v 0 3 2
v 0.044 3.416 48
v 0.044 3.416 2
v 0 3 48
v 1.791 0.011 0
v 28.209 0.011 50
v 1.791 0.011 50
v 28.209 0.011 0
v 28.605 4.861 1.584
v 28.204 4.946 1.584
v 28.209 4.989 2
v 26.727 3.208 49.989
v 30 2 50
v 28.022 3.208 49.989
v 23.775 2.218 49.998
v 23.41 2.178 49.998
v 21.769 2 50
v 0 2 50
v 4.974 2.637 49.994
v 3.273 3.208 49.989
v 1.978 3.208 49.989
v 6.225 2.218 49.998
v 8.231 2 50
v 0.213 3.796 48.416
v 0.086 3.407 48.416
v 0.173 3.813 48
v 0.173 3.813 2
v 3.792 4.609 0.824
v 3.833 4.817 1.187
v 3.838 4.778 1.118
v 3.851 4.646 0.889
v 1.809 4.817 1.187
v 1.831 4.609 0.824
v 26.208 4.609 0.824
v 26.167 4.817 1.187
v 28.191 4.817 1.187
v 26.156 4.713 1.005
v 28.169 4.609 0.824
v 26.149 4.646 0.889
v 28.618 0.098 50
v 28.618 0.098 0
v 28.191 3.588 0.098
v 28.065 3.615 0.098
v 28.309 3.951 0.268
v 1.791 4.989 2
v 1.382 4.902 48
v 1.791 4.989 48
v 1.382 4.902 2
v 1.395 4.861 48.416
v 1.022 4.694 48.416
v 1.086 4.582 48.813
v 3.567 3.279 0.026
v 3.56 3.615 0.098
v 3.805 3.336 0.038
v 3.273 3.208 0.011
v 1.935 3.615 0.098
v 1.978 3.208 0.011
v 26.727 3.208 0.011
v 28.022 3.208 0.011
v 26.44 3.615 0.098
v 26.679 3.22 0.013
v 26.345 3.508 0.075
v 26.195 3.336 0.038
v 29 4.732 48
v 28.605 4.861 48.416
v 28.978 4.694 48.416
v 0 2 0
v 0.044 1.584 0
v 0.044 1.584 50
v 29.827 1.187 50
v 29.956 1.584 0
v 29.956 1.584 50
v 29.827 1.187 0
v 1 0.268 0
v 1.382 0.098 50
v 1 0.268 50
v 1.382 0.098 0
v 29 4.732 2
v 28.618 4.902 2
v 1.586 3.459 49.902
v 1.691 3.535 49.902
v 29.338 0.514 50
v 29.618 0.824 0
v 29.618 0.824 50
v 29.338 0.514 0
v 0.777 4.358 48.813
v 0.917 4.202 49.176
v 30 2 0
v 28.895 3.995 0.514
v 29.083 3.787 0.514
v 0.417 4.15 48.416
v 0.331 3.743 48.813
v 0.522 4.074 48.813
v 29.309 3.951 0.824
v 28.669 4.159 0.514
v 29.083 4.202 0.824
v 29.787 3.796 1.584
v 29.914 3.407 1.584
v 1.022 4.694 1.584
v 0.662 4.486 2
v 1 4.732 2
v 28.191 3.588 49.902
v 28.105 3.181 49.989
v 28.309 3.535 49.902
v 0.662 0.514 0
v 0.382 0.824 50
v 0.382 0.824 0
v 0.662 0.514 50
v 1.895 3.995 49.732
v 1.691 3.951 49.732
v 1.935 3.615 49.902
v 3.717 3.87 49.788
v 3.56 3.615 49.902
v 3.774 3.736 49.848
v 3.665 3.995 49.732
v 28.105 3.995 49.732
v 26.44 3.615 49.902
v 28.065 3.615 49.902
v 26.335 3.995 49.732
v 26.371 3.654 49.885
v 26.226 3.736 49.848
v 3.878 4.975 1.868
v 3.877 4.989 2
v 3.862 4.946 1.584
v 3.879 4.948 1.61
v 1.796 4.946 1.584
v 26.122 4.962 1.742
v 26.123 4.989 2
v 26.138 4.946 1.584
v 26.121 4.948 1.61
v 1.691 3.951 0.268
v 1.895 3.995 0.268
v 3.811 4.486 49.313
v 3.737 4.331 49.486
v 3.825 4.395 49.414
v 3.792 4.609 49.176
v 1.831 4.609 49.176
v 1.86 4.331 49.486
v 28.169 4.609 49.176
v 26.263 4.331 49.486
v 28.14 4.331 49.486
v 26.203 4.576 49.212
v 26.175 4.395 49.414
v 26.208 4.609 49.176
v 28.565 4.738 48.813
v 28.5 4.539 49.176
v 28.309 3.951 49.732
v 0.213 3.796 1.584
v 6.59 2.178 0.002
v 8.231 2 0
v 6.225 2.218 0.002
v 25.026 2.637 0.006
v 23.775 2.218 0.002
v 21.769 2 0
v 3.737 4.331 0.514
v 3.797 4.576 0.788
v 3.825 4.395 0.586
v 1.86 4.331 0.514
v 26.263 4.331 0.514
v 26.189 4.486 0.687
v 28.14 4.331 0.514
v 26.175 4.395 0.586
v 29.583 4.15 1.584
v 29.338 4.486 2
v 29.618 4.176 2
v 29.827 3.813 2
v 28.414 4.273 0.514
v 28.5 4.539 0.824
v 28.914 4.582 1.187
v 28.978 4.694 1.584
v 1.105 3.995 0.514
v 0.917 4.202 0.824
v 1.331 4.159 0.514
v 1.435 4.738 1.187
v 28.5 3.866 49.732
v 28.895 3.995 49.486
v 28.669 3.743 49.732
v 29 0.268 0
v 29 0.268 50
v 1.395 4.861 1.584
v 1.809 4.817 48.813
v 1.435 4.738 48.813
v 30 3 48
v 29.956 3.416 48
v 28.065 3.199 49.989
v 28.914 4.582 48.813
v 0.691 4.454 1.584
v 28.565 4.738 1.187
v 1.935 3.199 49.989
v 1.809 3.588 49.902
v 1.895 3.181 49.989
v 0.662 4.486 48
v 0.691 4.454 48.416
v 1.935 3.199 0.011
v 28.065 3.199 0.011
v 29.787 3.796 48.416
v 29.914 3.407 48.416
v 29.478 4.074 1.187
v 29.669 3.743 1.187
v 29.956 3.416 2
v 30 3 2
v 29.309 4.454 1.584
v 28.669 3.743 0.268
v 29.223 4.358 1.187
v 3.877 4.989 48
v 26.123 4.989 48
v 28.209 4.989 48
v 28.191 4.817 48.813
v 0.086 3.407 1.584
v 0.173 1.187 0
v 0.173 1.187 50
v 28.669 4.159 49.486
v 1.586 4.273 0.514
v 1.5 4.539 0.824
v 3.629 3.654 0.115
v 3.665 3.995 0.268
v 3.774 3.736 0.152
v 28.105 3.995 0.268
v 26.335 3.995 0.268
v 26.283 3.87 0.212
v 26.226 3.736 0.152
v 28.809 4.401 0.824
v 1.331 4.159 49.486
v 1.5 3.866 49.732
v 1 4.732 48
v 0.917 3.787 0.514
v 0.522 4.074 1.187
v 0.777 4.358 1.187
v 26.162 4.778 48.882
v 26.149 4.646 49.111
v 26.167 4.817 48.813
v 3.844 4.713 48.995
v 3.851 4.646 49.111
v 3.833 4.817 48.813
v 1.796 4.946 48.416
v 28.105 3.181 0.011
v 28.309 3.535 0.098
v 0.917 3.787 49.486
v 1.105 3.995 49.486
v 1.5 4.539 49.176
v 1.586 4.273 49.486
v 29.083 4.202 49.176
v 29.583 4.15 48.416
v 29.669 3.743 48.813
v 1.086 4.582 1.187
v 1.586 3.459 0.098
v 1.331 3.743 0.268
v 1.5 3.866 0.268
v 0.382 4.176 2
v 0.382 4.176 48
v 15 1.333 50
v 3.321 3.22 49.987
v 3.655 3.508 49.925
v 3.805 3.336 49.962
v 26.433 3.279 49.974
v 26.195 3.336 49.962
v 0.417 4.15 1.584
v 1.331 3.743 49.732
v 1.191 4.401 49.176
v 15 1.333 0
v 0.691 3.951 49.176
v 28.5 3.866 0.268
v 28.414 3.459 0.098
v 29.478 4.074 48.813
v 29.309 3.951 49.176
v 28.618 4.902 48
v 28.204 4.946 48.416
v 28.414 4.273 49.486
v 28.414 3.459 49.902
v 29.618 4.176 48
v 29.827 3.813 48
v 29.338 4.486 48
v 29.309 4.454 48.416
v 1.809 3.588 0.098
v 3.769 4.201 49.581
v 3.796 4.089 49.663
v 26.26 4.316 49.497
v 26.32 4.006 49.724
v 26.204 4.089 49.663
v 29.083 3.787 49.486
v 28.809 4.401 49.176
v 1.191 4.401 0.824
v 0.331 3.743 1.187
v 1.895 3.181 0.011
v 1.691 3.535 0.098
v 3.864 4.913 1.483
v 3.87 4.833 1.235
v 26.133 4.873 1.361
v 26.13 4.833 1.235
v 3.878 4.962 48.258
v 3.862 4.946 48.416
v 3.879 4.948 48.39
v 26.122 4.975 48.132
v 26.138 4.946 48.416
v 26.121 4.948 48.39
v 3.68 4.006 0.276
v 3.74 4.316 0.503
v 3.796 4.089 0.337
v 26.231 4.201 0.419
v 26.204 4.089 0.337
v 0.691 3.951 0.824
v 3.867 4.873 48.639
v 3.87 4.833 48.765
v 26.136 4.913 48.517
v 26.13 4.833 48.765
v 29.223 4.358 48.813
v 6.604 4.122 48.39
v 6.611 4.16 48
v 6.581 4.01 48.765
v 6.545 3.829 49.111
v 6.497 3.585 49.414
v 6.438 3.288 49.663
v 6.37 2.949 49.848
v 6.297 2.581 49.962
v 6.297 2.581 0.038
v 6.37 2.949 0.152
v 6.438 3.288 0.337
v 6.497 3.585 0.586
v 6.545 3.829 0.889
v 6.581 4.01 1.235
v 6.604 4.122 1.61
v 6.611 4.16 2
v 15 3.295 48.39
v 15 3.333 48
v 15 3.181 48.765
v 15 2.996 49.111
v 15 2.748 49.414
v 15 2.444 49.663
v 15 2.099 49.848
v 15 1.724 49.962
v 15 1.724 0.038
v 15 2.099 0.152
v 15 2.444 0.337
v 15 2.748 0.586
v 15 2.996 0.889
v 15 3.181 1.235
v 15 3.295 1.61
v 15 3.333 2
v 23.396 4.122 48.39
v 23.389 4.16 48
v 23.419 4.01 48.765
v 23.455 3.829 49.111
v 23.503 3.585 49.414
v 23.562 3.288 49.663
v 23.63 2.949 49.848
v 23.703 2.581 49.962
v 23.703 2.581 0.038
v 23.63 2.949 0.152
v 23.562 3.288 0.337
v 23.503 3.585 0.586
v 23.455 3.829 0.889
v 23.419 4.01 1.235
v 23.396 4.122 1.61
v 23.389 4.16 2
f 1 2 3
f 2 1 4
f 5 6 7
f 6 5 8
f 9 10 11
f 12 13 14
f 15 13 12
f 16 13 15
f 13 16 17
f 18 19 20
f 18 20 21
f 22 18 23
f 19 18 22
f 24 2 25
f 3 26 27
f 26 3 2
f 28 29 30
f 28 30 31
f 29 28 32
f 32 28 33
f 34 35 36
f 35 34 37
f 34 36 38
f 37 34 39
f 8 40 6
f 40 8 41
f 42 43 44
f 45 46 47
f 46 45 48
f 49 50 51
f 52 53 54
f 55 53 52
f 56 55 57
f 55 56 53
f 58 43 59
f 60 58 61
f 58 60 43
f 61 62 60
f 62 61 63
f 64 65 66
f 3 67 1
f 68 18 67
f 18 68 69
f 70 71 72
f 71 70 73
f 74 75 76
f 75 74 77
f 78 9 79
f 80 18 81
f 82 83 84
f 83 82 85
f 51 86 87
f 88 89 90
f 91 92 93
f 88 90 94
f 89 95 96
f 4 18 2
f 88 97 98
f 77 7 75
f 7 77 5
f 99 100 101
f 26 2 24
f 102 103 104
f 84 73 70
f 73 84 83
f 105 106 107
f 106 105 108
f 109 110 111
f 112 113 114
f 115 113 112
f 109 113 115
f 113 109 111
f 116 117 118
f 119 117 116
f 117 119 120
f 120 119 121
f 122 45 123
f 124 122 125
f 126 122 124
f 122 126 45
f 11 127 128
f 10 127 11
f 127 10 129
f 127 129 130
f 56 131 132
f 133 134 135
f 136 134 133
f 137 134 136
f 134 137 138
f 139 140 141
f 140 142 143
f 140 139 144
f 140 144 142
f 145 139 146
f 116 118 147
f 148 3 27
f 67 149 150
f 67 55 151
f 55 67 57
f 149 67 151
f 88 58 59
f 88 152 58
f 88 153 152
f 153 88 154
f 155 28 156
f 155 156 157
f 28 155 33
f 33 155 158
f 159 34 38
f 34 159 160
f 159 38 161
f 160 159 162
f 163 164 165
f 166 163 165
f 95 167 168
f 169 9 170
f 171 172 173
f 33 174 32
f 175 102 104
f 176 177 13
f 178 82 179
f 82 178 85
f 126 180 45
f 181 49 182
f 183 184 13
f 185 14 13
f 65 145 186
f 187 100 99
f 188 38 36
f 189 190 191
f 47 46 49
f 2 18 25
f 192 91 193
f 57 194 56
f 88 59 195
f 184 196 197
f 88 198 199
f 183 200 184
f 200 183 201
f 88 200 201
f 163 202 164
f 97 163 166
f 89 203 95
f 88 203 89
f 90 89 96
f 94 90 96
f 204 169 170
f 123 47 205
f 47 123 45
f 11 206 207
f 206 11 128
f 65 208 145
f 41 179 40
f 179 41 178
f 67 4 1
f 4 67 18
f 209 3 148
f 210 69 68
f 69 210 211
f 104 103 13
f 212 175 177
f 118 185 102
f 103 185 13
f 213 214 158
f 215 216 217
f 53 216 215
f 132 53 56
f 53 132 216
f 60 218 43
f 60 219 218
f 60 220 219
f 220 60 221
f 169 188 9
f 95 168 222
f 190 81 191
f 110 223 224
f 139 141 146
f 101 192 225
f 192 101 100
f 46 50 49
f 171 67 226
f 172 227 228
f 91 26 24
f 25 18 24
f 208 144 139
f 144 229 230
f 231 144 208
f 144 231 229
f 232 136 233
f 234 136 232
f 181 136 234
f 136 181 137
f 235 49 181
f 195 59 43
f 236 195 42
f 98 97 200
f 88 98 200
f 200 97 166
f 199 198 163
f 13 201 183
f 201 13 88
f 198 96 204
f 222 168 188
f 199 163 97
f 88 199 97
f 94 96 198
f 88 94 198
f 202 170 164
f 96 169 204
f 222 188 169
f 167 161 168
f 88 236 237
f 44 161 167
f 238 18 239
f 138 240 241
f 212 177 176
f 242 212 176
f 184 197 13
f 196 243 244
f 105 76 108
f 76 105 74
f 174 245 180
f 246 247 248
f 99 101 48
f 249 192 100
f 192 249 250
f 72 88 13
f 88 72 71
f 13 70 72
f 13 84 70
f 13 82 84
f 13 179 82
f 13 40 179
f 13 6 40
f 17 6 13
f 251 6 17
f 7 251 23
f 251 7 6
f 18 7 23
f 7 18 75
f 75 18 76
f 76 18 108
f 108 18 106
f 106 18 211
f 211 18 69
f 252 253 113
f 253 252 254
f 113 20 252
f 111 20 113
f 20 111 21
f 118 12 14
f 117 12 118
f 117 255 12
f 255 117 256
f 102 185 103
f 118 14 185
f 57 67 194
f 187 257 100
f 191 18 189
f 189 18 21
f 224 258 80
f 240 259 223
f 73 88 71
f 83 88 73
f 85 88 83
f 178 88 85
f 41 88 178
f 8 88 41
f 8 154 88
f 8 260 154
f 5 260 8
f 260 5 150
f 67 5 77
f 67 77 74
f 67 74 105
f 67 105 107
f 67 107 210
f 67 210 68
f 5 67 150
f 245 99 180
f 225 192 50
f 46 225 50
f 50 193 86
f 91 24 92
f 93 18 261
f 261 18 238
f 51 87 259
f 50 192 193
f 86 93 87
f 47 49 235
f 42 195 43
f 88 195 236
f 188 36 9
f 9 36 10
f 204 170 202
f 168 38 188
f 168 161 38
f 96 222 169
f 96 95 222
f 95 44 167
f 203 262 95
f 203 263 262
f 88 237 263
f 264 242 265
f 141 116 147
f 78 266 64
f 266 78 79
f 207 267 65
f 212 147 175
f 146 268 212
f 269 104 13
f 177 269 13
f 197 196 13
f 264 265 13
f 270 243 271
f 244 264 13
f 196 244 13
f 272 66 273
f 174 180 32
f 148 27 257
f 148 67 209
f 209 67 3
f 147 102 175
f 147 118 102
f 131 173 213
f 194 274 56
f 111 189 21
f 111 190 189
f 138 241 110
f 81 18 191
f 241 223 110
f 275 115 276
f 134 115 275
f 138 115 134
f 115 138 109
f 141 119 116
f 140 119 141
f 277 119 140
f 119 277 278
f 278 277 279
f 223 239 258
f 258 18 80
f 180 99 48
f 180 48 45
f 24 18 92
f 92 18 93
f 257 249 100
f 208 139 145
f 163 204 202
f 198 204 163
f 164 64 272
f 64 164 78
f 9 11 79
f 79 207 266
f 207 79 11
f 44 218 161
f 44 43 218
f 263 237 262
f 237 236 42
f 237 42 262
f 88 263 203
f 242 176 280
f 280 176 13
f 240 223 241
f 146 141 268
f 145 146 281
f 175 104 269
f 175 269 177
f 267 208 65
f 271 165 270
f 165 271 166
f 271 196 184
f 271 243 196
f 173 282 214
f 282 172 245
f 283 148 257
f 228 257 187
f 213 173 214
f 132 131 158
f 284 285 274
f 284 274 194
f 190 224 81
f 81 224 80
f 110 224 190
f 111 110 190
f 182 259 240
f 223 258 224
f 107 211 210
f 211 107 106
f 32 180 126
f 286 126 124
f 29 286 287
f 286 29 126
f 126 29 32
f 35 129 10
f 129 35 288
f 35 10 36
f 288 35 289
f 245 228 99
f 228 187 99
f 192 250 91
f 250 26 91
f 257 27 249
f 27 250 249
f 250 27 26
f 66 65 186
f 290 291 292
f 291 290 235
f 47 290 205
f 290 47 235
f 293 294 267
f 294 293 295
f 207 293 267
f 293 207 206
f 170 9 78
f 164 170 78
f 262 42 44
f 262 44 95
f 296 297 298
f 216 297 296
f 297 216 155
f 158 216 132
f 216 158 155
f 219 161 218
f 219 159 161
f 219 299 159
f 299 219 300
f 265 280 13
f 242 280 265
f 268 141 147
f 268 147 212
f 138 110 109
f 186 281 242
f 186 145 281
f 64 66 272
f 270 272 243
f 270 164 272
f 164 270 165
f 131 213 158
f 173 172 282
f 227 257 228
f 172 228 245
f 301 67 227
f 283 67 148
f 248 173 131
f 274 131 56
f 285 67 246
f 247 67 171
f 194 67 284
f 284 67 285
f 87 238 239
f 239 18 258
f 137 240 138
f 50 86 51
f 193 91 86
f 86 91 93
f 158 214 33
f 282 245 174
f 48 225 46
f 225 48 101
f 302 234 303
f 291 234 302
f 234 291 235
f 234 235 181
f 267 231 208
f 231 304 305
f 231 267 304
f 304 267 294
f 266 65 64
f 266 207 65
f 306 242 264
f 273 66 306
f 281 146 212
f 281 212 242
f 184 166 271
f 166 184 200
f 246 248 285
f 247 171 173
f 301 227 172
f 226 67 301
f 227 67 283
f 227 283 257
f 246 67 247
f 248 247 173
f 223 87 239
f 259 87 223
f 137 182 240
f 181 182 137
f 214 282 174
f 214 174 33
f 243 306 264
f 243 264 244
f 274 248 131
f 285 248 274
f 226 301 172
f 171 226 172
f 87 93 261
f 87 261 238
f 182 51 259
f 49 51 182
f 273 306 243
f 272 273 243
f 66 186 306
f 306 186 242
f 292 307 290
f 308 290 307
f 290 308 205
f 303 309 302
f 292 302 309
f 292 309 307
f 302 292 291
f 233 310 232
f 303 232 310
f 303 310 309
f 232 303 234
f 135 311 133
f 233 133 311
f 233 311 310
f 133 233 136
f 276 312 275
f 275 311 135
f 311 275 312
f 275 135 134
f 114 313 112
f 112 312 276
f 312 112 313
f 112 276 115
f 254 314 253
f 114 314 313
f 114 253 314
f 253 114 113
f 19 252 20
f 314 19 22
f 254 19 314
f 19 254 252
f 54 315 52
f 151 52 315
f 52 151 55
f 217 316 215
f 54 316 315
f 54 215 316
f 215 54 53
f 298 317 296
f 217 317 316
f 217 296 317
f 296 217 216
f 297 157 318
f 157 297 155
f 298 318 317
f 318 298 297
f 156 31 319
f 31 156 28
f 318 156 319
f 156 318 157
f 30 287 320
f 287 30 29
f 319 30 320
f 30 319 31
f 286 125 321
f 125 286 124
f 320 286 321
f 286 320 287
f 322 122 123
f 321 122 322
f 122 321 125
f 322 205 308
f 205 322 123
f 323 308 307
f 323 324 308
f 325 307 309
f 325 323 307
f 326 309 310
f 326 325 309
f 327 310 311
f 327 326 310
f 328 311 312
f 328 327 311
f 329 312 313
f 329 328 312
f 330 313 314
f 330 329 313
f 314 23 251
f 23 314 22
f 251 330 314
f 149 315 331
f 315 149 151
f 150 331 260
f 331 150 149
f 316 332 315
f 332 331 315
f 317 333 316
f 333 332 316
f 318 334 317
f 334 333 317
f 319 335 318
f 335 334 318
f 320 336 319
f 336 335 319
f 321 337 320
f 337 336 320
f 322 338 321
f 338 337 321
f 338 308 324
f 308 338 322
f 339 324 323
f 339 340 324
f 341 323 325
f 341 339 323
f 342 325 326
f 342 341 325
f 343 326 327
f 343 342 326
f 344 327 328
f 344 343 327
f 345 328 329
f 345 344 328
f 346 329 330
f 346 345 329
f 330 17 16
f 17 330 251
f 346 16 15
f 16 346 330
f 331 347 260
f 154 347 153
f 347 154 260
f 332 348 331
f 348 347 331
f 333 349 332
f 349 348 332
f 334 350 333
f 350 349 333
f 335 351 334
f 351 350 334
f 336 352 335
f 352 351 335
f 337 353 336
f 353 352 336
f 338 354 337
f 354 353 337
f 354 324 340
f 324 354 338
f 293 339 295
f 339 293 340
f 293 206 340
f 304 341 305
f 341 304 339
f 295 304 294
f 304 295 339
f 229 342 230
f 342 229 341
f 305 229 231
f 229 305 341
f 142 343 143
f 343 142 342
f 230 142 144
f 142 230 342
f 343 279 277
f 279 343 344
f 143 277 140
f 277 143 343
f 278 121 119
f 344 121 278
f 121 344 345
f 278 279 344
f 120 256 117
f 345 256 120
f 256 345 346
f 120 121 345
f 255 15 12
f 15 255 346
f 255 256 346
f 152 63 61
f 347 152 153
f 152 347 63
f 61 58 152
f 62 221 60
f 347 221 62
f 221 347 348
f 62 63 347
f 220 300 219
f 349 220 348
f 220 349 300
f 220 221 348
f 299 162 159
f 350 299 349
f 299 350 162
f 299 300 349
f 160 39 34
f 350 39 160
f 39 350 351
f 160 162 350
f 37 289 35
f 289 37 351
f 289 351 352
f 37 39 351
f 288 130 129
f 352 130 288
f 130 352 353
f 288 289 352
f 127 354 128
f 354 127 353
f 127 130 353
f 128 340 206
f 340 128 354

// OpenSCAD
//use <smooth_edges.scad>;

anglePrecission = 0.1;
roundingRadius = 2.0;
rr = roundingRadius;
rr2 = rr * 2;
highRes = false;
//highRes = true;

// key size [width, height, depth]
keySize = [30.0, 5.0, 50.0];

x = keySize[0];
y = keySize[1];
z = keySize[2];





//innerPitDepth = y / 3;
//innerPitRadius = 1.5 * x;
innerPitDepth = 5.0 / 3;
innerPitRadius = 1.5 * 30.0;

// distance of base key structure rectangle to the pit circle center
keyPitCenterDist = innerPitRadius - innerPitDepth;
pitAngleAbstr = acos(keyPitCenterDist / innerPitRadius);
pitAngleStart = 0 - pitAngleAbstr;
pitAngleEnd   = 0 + pitAngleAbstr;





module roundedRect2D(size, radius)
{
	x = size[0];
	y = size[1];
	z = size[2];
	r = radius;

	$fn = 30;

	linear_extrude(height = z)
	hull()
	{
		// place 4 circles in the corners, with the given radius
		translate([r, r, 0])
			circle(r = r);
		translate([x - r, r, 0])
			circle(r = r);
		translate([r, y - r, 0])
			circle(r = r);
		translate([x - r, y - r, 0])
			circle(r = r);
	}
}

module roundedRect3D(size, radius)
{
	x = size[0];
	y = size[1];
	z = size[2];
	r = radius;

	$fn = 30;

	hull()
	{
		// place a sphere with the given radius in each of the 8 corners
		translate([r, r, r])
			sphere(r = r);
		translate([r, r, z - r])
			sphere(r = r);
		translate([r, y - r, r])
			sphere(r = r);
		translate([r, y - r, z - r])
			sphere(r = r);
		translate([x - r, r, r])
			sphere(r = r);
		translate([x - r, r, z - r])
			sphere(r = r);
		translate([x - r, y - r, r])
			sphere(r = r);
		translate([x - r, y - r, z - r])
			sphere(r = r);
	}
}

module roundedRect2_5D(size, radius)
{
	x = size[0];
	y = size[1];
	z = size[2];
	r = radius;

	$fn = 30;

	hull()
	{
		// place a sphere with the given radius in each of the 8 corners
		translate([r, r, r])
			translate([0, 0, -r]) difference() { cylinder(h = 2 * r, r = r); translate([-(5 * r), 0, -(1 * r)]) cube([10 * r, 10 * r, 10 * r]); }
		translate([r, r, z - r])
			translate([0, 0, -r]) difference() { cylinder(h = 2 * r, r = r); translate([-(5 * r), 0, -(1 * r)]) cube([10 * r, 10 * r, 10 * r]); }
		translate([r, y - r, r])
			sphere(r = r);
		translate([r, y - r, z - r])
			sphere(r = r);
		translate([x - r, r, r])
			translate([0, 0, -r]) difference() { cylinder(h = 2 * r, r = r); translate([-(5 * r), 0, -(1 * r)]) cube([10 * r, 10 * r, 10 * r]); }
		translate([x - r, r, z - r])
			translate([0, 0, -r]) difference() { cylinder(h = 2 * r, r = r); translate([-(5 * r), 0, -(1 * r)]) cube([10 * r, 10 * r, 10 * r]); }
		translate([x - r, y - r, r])
			sphere(r = r);
		translate([x - r, y - r, z - r])
			sphere(r = r);
	}
}

module roundedRect2_25D(size, radius)
{
	x = size[0];
	y = size[1];
	z = size[2];
	r = radius;

	$fn = 30;

	hull()
	{
		// place a sphere with the given radius in each of the 8 corners
		translate([r, r, r])
			translate([0, 0, -r]) difference() { cylinder(h = 2 * r, r = r); translate([-(5 * r), 0, -(1 * r)]) cube([10 * r, 10 * r, 10 * r]); }
		translate([r, r, z - r])
			sphere(r = r);
		translate([r, y - r, r])
			sphere(r = r);
		translate([r, y - r, z - r])
			sphere(r = r);
		translate([x - r, r, r])
			translate([0, 0, -r]) difference() { cylinder(h = 2 * r, r = r); translate([-(5 * r), 0, -(1 * r)]) cube([10 * r, 10 * r, 10 * r]); }
		translate([x - r, r, z - r])
			sphere(r = r);
		translate([x - r, y - r, r])
			sphere(r = r);
		translate([x - r, y - r, z - r])
			sphere(r = r);
	}
}

module keySharp(size)
{
	x = size[0];
	y = size[1];
	z = size[2];

	//minkowski() {
		//translate([rr, rr, rr])
		//scale([(width - rr2) / width, (height - rr2) / height, (depth - rr2) / depth])
			difference() {
				// main shape
				//cube(keySize);
				//cube([width - rr2, height - rr2, depth - rr2]);
				roundedRect2_25D(keySize, rr);
				
				// inner/middle "finger bedding"/pit
				innerPitDepth = y / 3;
				innerPitRadius = 1.5 * x;
				translate([x/2, y - innerPitDepth + innerPitRadius, -1.0])
					cylinder(h = z + 2.0, r = innerPitRadius, $fa = anglePrecission);
			}
		//sphere(r = rr, $fa = anglePrecission);
	//}
}

module rounding(size, roundingRadius) {

	//minkowski()
	{
		keySharp(keySize);
		cube(roundingRadius * 2, center = true);
	}
	/*
	//minkowski()
	{
		keySharp(keySize);
		sphere(r = roundingRadius, $fn = 100);
		//cube(roundingRadius * 2, center = true);
	//}
	*/
}

module keySharp2(size)
{
	x = size[0];
	y = size[1];
	z = size[2];
	
	//minkowski()
	{
		//translate([rr, rr, rr])
		//scale([(width - rr2) / width, (height - rr2) / height, (depth - rr2) / depth])
			linear_extrude(convexity = 4)
		    difference() {
				// main shape
				//cube(keySize);
				//cube([width - rr2, height - rr2, depth - rr2]);
				square([x, y]);
				
				// inner/middle "finger bedding"/pit
				innerPitDepth = y / 3;
				innerPitRadius = 1.5 * x;
				translate([x/2, y - innerPitDepth + innerPitRadius, -1.0])
					cylinder(h = z + 2.0, r = innerPitRadius, $fa = anglePrecission);
			}
		sphere(r = roundingRadius, $fn = 100);
	}
/*
	points = [[0,0], [x,0], [x,y], [0,y]];
	polygon(points = points);
*/
}

module drawPitSphere(size, angle)
{
	x = size[0];
	y = size[1];
	z = size[2];
/*	
	echo("XXX : drawPitSphere: why no see?");
	echo(x);
	echo(y);
	echo(innerPitRadius);
*/
	translate([(x / 2) + (innerPitRadius * sin(angle)), (y - innerPitDepth + innerPitRadius) - (innerPitRadius * cos(angle)), 0])
		sphere(r = rr);
}

module drawPitHullPart(size, angle1, angle2)
{
	/*
	hull()
	{
		drawPitSphere(size, angle1);
		drawPitSphere(size, angle2);
	}
	*/
	hull()
	{
		hull()
		{
			translate([0, 0, z]) drawPitSphere(size, angle1);
			drawPitSphere(size, angle1);
		}
		hull()
		{
			translate([0, 0, z]) drawPitSphere(size, angle2);
			drawPitSphere(size, angle2);
		}
	}
}


module keySharp3(size)
{
	x = size[0];
	y = size[1];
	z = size[2];
/*
	echo("XXX : why no see?");
	echo(innerPitRadius);
	echo(keyPitCenterDist);
	echo(pitAngleAbstr);
	echo(pitAngleStart);
	echo(pitAngleEnd);
*/

/*
	//minkowski()
	{
		//translate([rr, rr, rr])
		//scale([(width - rr2) / width, (height - rr2) / height, (depth - rr2) / depth])
			linear_extrude(convexity = 4)
		    difference() {
				// main shape
				//cube(keySize);
				//cube([width - rr2, height - rr2, depth - rr2]);
				square([x, y]);
				
				// inner/middle "finger bedding"/pit
				translate([x/2, y - innerPitDepth + innerPitRadius, -1.0])
					cylinder(h = z + 2.0, r = innerPitRadius, $fa = anglePrecission);
			}
		sphere(r = roundingRadius, $fn = 100);
	}
*/

//	cube(keySize);

	//linear_extrude(convexity = 4)
	union()
	{
		//sphere(r = rr)
		parts = highRes ? 20 : 4;
		assert(floor(parts / 2) * 2 == parts, "Number of parts must be an even number!");
		
		angles = [ for (pi = [0:parts]) pitAngleStart + ((pitAngleEnd - pitAngleStart) / parts * pi) ];
		
		
		//angles[0] = pitAngleStart;
		for (pi = [1:(parts - 0)])
		{
			//angles[pi] = pitAngleStart + ((pitAngleEnd - pitAngleStart) / parts * pi);
			drawPitHullPart(keySize, angles[pi - 1], angles[pi]);
			//translate([(x / 2) + (innerPitRadius * sin(angle)), (y - innerPitDepth + innerPitRadius) - (innerPitRadius * cos(angle)), 0])
			//sphere(r = rr);
		}
		//angles[parts] = pitAngleEnd;
		//drawPitHullPart(keySize, angles[parts - 1], angles[parts]);
	}
}

/**
 * Constructs one side=wall of the form
 * that indents/creates a pit in the key.
 */
module keySharp4PitSideWall(size, roundingRadius)
{
	x = size[0];
	y = size[1];
	z = size[2];
	rr = roundingRadius;
	rr2 = rr * 2;

	translate([-rr, -rr, 0]) translate([x + 2 * y, 0, 0]) square(rr2);
	circle(r = rr, center = true);
}

/**
 * Constructs a Stenoboard-style key.
 */
module keySharp4(size, roundingRadius = 2.0)
{
	x = size[0];
	y = size[1];
	z = size[2];
	rr = roundingRadius;
	rr2 = rr * 2;

	intersection()
	{
		// the (smooth) base structure of the key
		roundedRect2_5D(size, rr);

		// the (smooth) pit for the finger
		{
			pitAngleRange = pitAngleEnd - pitAngleStart;
			//pitOverlapAngle = 2 * pitAngleRange;
			pitOverlapAngle = 180;
			$fn = (360 / pitOverlapAngle) * (highRes ? 80 : 16);
			translate([0, -rr, rr]) 
				translate([x / 2, innerPitRadius - innerPitDepth + y, 0])
				rotate(270 - (pitOverlapAngle / 2))
				rotate_extrude(angle = pitOverlapAngle, convexity = 10)
				translate([innerPitRadius, 0, 0])
				hull()
				{
					keySharp4PitSideWall(size, roundingRadius);
					translate([0, z - rr2, 0])
						keySharp4PitSideWall(size, roundingRadius);
				}
		}
	}
}



//rounding(keySize, rr);
//keySharp(keySize);
//keySharp2(keySize);

//$fn = highRes ? 40 : 8;
//%keySharp3(keySize);
keySharp4(keySize);


/*
$fn = 100;
module base(axis)
{ rotate(90,axis)
     linear_extrude(height=10, center=true, convexity = 2)
       polygon([[ 4, 0],[ 5, 1],[ 5, 4],[ 4, 5],[ 1, 5],
                [ 0, 4],[-1, 5],[-4, 5],[-5, 4],[-5, 1],
                [-4, 0],[-5,-1],[-5,-4],[-4,-5],[-1,-5],
                [ 0,-4],[ 1,-5],[ 4,-5],[ 5,-4],[ 5,-1] ]); }

intersection()
{ base([1,0,0]);
   base([0,1,0]);
   base([0,0,1]); }
*/


// rounding edges
/*
hull() {
	for (i=[0:3])
		translate([(i % 2) * 30, (i - i % 2) * 20, 0]) {
			cylinder(r=5, h=1);
			translate([0, 0, 10]) sphere(5);
		}
}
*/
